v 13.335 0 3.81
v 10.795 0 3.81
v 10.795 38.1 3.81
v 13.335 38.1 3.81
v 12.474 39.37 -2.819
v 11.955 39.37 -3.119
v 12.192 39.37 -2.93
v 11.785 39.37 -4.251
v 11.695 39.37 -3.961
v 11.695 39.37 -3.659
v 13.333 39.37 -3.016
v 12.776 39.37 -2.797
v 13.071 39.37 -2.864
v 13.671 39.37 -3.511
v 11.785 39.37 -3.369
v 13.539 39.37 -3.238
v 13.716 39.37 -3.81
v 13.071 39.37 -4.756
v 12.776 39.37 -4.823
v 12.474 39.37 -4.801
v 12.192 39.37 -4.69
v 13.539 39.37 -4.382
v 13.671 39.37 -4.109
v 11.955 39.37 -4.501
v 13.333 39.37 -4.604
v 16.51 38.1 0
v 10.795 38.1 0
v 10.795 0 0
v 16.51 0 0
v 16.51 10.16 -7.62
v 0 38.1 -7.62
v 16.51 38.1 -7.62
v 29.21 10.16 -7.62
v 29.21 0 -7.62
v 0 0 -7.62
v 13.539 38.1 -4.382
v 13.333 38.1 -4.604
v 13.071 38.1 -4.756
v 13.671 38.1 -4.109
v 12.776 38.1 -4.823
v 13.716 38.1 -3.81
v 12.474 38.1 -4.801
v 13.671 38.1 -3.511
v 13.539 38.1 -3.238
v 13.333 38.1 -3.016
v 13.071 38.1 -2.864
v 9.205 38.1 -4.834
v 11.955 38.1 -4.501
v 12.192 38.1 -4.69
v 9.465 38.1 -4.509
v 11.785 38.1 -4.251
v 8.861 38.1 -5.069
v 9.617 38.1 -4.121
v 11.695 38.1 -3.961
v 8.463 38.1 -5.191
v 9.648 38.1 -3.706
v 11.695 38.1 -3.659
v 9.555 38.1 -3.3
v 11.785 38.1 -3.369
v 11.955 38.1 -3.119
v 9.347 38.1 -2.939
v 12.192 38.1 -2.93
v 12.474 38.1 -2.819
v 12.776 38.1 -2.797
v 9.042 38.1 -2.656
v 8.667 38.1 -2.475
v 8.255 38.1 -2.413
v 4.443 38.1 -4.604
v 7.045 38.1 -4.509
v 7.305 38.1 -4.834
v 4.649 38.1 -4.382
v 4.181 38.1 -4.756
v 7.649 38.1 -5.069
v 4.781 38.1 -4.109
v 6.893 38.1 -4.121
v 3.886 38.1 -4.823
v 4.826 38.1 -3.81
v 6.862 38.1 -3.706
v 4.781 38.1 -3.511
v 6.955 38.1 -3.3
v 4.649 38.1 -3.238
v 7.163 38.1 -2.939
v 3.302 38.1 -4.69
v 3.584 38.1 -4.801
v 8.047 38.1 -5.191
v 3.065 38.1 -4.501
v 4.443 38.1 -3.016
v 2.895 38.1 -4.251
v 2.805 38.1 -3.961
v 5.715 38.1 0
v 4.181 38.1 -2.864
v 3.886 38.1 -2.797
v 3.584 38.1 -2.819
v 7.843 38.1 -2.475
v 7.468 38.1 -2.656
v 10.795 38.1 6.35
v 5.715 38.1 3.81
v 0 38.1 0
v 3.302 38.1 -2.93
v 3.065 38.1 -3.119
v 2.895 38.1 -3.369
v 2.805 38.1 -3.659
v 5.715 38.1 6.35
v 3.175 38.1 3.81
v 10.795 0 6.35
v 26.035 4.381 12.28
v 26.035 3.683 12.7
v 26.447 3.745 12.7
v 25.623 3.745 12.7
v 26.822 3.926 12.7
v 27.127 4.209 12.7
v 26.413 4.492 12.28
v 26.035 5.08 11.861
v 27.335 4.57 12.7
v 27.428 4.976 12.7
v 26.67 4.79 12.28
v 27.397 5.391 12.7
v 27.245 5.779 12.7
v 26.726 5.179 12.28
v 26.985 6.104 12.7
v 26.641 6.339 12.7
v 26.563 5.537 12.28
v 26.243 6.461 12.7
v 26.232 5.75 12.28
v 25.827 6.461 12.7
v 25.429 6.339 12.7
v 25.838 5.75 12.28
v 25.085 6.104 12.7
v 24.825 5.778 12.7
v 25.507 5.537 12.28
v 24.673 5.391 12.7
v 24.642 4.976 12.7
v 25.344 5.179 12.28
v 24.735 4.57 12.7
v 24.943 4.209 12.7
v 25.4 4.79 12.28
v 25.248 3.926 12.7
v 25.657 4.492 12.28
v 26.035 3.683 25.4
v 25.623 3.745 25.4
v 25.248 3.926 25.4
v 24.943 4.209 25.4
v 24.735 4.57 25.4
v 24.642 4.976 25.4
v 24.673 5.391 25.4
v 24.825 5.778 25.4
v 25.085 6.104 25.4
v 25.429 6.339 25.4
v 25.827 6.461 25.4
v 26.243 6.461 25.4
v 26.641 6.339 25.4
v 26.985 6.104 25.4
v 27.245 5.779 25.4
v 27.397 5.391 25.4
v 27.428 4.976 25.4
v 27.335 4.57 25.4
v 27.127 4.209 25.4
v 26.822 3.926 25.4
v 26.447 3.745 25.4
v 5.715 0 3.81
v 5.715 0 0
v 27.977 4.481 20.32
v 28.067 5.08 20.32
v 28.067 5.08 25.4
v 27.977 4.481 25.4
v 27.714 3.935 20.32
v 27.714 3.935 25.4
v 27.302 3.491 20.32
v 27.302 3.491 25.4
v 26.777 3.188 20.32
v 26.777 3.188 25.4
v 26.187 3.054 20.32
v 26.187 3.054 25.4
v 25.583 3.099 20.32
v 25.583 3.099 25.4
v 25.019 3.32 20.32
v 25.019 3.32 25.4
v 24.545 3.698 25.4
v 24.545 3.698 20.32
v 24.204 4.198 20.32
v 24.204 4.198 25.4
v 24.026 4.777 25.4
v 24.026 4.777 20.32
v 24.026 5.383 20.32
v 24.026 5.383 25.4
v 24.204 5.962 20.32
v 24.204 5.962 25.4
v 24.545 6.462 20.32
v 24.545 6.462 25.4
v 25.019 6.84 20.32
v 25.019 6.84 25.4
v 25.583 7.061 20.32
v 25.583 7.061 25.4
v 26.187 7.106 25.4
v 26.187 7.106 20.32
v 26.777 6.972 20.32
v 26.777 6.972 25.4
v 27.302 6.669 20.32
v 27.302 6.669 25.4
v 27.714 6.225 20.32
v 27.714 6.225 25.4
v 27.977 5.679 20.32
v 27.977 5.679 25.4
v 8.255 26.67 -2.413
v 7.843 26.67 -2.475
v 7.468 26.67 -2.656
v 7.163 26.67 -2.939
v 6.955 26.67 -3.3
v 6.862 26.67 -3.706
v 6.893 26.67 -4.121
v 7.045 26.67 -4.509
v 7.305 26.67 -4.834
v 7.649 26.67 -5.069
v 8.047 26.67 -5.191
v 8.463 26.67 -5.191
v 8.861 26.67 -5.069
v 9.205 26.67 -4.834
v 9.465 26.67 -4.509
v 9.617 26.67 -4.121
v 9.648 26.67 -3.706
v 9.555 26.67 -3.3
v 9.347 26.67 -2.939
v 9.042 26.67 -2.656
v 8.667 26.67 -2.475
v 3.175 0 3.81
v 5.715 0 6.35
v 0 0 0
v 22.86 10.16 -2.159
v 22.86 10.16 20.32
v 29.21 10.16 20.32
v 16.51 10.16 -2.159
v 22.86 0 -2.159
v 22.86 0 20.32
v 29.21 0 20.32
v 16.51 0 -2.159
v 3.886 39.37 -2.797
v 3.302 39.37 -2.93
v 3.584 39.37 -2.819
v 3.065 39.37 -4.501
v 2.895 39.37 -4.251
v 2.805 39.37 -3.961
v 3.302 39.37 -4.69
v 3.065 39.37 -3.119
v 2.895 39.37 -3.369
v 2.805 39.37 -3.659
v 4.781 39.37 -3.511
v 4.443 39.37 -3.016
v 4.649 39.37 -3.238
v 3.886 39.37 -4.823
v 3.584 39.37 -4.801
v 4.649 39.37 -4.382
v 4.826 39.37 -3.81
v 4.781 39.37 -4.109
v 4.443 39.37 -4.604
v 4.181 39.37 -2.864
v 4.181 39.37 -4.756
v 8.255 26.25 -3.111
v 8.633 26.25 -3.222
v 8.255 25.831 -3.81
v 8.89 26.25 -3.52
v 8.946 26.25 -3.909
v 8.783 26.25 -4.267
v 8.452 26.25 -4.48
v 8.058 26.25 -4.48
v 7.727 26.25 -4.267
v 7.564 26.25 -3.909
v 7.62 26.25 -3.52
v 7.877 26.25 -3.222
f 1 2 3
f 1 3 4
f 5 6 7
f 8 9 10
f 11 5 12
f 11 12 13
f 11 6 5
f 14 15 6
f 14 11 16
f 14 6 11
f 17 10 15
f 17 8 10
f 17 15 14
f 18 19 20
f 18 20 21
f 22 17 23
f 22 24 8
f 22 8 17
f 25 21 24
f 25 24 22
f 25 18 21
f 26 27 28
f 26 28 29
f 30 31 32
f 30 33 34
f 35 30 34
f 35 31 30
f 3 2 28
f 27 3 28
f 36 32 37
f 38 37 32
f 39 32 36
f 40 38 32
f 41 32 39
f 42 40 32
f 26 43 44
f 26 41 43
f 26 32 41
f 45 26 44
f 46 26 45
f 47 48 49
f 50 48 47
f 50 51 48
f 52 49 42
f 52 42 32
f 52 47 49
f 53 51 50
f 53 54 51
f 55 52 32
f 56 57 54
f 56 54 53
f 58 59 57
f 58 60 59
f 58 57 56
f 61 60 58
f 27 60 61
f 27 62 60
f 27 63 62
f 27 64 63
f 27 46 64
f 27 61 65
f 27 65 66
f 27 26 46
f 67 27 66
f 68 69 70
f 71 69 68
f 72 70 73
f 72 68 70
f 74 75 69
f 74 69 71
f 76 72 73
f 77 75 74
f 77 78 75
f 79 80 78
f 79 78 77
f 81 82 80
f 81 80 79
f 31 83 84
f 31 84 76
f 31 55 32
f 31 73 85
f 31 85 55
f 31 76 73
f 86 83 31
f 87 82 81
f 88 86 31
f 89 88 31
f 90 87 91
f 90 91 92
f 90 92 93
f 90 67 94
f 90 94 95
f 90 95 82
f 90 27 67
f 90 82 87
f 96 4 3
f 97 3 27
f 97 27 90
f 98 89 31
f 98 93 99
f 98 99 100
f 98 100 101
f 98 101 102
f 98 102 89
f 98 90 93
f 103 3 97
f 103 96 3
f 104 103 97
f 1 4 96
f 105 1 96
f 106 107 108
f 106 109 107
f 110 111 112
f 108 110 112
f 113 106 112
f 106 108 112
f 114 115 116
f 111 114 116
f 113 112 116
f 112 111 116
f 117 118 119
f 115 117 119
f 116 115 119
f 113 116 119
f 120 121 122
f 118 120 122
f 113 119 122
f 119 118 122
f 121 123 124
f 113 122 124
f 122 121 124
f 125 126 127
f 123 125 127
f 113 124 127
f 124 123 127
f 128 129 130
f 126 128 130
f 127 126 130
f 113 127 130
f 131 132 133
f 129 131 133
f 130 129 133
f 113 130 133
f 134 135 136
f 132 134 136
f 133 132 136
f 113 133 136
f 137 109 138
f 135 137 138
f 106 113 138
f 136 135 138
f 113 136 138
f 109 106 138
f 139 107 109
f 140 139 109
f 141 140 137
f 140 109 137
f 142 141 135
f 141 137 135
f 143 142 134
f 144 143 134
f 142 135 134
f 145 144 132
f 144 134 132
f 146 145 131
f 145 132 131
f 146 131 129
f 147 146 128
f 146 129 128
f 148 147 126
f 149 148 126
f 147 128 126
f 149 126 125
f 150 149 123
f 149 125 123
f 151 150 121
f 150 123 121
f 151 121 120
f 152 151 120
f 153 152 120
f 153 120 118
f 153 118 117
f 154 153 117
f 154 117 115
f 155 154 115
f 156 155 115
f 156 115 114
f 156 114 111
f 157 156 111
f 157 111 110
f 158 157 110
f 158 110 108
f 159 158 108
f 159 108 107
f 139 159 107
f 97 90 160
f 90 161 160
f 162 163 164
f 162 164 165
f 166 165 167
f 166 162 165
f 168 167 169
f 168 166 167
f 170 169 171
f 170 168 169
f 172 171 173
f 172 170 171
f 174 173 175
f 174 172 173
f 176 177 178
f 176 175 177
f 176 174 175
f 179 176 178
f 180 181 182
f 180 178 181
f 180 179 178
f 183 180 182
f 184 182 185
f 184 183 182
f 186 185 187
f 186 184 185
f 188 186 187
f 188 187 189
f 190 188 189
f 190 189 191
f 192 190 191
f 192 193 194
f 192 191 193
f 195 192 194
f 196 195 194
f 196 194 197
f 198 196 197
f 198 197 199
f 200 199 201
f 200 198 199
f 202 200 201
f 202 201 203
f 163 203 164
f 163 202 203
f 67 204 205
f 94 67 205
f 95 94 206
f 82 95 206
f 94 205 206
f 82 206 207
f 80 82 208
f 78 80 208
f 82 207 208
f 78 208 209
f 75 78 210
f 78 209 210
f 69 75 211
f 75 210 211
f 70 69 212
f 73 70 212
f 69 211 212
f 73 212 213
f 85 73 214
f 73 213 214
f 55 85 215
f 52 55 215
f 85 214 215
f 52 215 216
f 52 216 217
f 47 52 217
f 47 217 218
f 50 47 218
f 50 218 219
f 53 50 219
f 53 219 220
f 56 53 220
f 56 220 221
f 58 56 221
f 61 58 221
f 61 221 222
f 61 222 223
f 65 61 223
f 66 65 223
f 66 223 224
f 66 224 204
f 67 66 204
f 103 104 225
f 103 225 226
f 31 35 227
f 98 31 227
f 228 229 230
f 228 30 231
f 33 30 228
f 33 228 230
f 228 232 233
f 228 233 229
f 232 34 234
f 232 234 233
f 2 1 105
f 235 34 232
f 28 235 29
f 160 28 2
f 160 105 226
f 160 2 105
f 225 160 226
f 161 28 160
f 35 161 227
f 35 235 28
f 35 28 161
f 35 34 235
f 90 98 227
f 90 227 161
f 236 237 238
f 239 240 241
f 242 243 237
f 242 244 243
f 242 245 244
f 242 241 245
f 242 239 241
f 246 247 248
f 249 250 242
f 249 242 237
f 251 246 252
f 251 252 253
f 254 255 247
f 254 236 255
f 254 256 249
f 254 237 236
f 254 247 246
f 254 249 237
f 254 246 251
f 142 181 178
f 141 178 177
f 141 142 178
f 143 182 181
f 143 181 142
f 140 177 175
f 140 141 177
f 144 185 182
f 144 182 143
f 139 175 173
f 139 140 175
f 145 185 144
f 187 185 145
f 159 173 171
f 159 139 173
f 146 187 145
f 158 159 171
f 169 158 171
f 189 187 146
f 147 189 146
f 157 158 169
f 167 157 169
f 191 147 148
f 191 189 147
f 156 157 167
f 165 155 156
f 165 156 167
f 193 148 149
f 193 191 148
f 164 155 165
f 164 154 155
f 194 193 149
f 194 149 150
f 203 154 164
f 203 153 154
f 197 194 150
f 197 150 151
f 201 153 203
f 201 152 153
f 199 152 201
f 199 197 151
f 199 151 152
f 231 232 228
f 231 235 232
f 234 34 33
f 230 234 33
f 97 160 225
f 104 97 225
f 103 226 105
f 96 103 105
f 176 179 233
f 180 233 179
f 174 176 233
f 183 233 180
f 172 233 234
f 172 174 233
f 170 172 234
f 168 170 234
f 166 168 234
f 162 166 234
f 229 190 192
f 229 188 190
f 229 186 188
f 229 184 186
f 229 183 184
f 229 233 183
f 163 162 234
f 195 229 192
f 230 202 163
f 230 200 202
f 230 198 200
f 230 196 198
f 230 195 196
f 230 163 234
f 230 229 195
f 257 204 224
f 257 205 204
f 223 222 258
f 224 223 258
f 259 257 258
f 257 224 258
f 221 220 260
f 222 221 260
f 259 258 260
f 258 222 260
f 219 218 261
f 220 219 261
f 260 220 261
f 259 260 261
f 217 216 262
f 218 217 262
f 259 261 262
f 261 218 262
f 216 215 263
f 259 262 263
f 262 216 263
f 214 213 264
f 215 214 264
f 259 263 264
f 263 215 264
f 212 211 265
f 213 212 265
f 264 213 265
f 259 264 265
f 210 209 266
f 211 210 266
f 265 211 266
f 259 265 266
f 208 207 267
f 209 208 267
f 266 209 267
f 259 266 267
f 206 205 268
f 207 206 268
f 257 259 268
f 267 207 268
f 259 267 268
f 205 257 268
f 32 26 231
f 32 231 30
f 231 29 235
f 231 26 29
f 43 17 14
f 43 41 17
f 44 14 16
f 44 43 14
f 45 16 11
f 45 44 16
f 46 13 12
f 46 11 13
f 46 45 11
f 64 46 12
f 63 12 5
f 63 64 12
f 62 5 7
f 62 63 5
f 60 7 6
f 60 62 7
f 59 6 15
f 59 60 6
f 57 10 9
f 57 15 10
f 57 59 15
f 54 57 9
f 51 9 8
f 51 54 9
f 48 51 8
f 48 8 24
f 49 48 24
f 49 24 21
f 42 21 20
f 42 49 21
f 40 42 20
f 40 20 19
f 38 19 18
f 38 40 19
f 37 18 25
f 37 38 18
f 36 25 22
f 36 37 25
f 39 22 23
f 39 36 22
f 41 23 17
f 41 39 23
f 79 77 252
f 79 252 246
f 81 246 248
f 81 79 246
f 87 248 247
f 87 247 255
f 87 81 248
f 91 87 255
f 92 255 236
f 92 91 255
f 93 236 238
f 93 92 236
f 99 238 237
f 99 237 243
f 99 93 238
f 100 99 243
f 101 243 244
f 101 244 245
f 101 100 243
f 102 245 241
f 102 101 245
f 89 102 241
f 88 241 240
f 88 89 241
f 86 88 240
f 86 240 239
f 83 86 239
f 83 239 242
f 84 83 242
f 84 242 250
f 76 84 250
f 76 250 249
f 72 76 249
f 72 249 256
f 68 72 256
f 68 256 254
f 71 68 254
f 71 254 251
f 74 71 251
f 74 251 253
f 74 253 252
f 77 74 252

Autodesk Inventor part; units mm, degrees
ref_plane "YZ Plane" through (0, 0, 0) normal (1, 0, 0) x (0, 1, 0)
ref_plane "XZ Plane" through (0, 0, 0) normal (0, 1, 0) x (-1, 0, 0)
ref_plane "XY Plane" through (0, 0, 0) normal (0, 0, 1) x (1, 0, 0)
sketch "Sketch1" plane through (0, 0, 0) normal (0, 1, 0) x (-1, 0, 0)
  line L0 (0, 0) -> (-16.51, 0)
  line L1 (-16.51, 0) -> (-16.51, -7.62)
  line L2 (-16.51, -7.62) -> (0, -7.62)
  line L3 (0, -7.62) -> (0, 0)
  line L4 (-8.255, 0) -> (-5.715, 0)
  line L5 (-5.715, 0) -> (-5.715, 6.35)
  line L6 (-5.715, 6.35) -> (-10.795, 6.35)
  line L7 (-10.795, 6.35) -> (-10.795, 0)
  line L8 (-5.715, -7.62) -> (-5.715, -8.89)
  line L9 (-5.715, -8.89) -> (-10.795, -8.89)
  line L10 (-10.795, -8.89) -> (-10.795, -7.62)
  line L11 (-10.795, 6.35) -> (-10.795, 3.81)
  line L12 (-10.795, 3.81) -> (-13.335, 3.81)
  line L13 (-13.335, 3.81) -> (-10.795, 6.35)
  line L14 (-5.715, 6.35) -> (-5.715, 3.81)
  line L15 (-5.715, 3.81) -> (-3.175, 3.81)
  line L16 (-3.175, 3.81) -> (-5.715, 6.35)
  point P0 (-8.255, -7.62)
  point P1 (0, -3.81)
  point P2 (-16.51, -3.81)
  dimension "d0" = 16.51
  dimension "d1" = 7.62
  dimension "d2" = 2.54
  dimension "d3" = 6.35
  dimension "d4" = 5.08
  dimension "d5" = 1.27
  dimension "d6" = 2.54
  dimension "d7" = 2.54
  dimension "d8" = 2.54
  dimension "d9" = 2.54
extrude "Extrusion1" add sketch "Sketch1" along normal blind 38.1
sketch "Sketch2" plane through (0, 38.1, 0) normal (0, 1, 0) x (1, 0, 0)
  line L0 (16.51, 0) -> (16.51, 7.62) projected
  line L1 (16.51, 3.81) -> (12.7, 3.81)
  line L2 (0, 7.62) -> (0, 0) projected
  circle A0 centre (12.7, 3.81) radius 1.016
  dimension "d12" = 3.81
  dimension "d14" = 2.032
extrude "Extrusion2" add sketch "Sketch2" along normal blind 1.27
sketch "Sketch3" plane through (0, 38.1, 0) normal (0, 1, 0) x (1, 0, 0)
  line L0 (0, 7.62) -> (0, 0) projected
  line L1 (0, 3.81) -> (3.81, 3.81)
  circle A0 centre (3.81, 3.81) radius 1.016
  dimension "d20" = 3.81
  dimension "d21" = 2.032
extrude "Extrusion3" add sketch "Sketch3" along normal blind 1.27
sketch "Sketch6" plane through (0, 38.1, 0) normal (0, 1, 0) x (1, 0, 0)
  line L0 (16.51, 0) -> (16.51, 7.62) projected
  line L1 (16.51, 3.81) -> (8.255, 3.81)
  circle A0 centre (8.255, 3.81) radius 1.397
  point P0 (0, 0)
  dimension "d24" = 8.255
  dimension "d25" = 2.794
hole "Hole1" at (8.255, 38.1, -3.81) at (8.255, 38.1, -3.81) direction (0, -1, 0) diameter 2.794 depth 11.43 tip angle 118
sketch "Sketch7" plane through (16.51, 0, 0) normal (1, 0, 0) x (0, 0, -1)
  line L0 (0, 0) -> (7.62, 0) projected
  line L1 (7.62, 0) -> (2.159, 0)
  line L2 (2.159, 0) -> (2.159, 10.16)
  line L3 (2.159, 10.16) -> (7.62, 10.16)
  line L4 (7.62, 10.16) -> (7.62, 0)
  dimension "d33" = 5.461
  dimension "d34" = 10.16
extrude "Extrusion4" add sketch "Sketch7" along normal blind 12.7
sketch "Sketch8" plane through (16.51, 0, -2.159) normal (0, 0, 1) x (1, 0, 0)
  line L0 (12.7, 0) -> (12.7, 10.16) projected
  line L1 (0, 10.16) -> (12.7, 10.16) projected
  line L2 (12.7, 0) -> (6.35, 0)
  line L3 (6.35, 0) -> (6.35, 10.16)
  line L4 (6.35, 10.16) -> (12.7, 10.16)
  line L5 (12.7, 10.16) -> (12.7, 0)
  point P0 (-16.51, 0)
extrude "Extrusion5" add sketch "Sketch8" along normal blind 22.479
sketch "Sketch11" plane through (16.51, 0, 20.32) normal (0, 0, 1) x (1, 0, 0)
  line L0 (12.7, 0) -> (12.7, 10.16) projected
  line L1 (12.7, 5.08) -> (9.525, 5.08)
  circle A0 centre (9.525, 5.08) radius 2.032
  point P0 (-16.51, 0)
  dimension "d41" = 3.175
  dimension "d42" = 4.064
extrude "Extrusion6" add sketch "Sketch11" along normal blind 5.08
sketch "Sketch12" plane through (26.035, 5.08, 25.4) normal (0, 0, 1) x (1, 0, 0)
  circle A0 centre (0, 0) radius 1.397
  point P0 (-26.035, -5.08)
  dimension "d45" = 2.794
hole "Hole2" at (26.035, 5.08, 25.4) direction (0, 0, -1) diameter 2.794 depth 12.7 tip angle 118
sketch "Sketch13" plane through (10.795, 0, -8.89) normal (0, 0, -1) x (-1, 0, 0)
  line L0 (0, 0) -> (0, 38.1) projected
  line L1 (0, 0) -> (5.08, 0) projected
  line L2 (0, 38.1) -> (5.08, 38.1)
  line L3 (5.08, 38.1) -> (5.08, 0)
  line L4 (5.08, 0) -> (0, 0)
  line L5 (0, 0) -> (0, 38.1)
  point P0 (10.795, 0)
extrude "Extrusion7" cut sketch "Sketch13" against normal blind 1.27
properties part number "Grab1"
